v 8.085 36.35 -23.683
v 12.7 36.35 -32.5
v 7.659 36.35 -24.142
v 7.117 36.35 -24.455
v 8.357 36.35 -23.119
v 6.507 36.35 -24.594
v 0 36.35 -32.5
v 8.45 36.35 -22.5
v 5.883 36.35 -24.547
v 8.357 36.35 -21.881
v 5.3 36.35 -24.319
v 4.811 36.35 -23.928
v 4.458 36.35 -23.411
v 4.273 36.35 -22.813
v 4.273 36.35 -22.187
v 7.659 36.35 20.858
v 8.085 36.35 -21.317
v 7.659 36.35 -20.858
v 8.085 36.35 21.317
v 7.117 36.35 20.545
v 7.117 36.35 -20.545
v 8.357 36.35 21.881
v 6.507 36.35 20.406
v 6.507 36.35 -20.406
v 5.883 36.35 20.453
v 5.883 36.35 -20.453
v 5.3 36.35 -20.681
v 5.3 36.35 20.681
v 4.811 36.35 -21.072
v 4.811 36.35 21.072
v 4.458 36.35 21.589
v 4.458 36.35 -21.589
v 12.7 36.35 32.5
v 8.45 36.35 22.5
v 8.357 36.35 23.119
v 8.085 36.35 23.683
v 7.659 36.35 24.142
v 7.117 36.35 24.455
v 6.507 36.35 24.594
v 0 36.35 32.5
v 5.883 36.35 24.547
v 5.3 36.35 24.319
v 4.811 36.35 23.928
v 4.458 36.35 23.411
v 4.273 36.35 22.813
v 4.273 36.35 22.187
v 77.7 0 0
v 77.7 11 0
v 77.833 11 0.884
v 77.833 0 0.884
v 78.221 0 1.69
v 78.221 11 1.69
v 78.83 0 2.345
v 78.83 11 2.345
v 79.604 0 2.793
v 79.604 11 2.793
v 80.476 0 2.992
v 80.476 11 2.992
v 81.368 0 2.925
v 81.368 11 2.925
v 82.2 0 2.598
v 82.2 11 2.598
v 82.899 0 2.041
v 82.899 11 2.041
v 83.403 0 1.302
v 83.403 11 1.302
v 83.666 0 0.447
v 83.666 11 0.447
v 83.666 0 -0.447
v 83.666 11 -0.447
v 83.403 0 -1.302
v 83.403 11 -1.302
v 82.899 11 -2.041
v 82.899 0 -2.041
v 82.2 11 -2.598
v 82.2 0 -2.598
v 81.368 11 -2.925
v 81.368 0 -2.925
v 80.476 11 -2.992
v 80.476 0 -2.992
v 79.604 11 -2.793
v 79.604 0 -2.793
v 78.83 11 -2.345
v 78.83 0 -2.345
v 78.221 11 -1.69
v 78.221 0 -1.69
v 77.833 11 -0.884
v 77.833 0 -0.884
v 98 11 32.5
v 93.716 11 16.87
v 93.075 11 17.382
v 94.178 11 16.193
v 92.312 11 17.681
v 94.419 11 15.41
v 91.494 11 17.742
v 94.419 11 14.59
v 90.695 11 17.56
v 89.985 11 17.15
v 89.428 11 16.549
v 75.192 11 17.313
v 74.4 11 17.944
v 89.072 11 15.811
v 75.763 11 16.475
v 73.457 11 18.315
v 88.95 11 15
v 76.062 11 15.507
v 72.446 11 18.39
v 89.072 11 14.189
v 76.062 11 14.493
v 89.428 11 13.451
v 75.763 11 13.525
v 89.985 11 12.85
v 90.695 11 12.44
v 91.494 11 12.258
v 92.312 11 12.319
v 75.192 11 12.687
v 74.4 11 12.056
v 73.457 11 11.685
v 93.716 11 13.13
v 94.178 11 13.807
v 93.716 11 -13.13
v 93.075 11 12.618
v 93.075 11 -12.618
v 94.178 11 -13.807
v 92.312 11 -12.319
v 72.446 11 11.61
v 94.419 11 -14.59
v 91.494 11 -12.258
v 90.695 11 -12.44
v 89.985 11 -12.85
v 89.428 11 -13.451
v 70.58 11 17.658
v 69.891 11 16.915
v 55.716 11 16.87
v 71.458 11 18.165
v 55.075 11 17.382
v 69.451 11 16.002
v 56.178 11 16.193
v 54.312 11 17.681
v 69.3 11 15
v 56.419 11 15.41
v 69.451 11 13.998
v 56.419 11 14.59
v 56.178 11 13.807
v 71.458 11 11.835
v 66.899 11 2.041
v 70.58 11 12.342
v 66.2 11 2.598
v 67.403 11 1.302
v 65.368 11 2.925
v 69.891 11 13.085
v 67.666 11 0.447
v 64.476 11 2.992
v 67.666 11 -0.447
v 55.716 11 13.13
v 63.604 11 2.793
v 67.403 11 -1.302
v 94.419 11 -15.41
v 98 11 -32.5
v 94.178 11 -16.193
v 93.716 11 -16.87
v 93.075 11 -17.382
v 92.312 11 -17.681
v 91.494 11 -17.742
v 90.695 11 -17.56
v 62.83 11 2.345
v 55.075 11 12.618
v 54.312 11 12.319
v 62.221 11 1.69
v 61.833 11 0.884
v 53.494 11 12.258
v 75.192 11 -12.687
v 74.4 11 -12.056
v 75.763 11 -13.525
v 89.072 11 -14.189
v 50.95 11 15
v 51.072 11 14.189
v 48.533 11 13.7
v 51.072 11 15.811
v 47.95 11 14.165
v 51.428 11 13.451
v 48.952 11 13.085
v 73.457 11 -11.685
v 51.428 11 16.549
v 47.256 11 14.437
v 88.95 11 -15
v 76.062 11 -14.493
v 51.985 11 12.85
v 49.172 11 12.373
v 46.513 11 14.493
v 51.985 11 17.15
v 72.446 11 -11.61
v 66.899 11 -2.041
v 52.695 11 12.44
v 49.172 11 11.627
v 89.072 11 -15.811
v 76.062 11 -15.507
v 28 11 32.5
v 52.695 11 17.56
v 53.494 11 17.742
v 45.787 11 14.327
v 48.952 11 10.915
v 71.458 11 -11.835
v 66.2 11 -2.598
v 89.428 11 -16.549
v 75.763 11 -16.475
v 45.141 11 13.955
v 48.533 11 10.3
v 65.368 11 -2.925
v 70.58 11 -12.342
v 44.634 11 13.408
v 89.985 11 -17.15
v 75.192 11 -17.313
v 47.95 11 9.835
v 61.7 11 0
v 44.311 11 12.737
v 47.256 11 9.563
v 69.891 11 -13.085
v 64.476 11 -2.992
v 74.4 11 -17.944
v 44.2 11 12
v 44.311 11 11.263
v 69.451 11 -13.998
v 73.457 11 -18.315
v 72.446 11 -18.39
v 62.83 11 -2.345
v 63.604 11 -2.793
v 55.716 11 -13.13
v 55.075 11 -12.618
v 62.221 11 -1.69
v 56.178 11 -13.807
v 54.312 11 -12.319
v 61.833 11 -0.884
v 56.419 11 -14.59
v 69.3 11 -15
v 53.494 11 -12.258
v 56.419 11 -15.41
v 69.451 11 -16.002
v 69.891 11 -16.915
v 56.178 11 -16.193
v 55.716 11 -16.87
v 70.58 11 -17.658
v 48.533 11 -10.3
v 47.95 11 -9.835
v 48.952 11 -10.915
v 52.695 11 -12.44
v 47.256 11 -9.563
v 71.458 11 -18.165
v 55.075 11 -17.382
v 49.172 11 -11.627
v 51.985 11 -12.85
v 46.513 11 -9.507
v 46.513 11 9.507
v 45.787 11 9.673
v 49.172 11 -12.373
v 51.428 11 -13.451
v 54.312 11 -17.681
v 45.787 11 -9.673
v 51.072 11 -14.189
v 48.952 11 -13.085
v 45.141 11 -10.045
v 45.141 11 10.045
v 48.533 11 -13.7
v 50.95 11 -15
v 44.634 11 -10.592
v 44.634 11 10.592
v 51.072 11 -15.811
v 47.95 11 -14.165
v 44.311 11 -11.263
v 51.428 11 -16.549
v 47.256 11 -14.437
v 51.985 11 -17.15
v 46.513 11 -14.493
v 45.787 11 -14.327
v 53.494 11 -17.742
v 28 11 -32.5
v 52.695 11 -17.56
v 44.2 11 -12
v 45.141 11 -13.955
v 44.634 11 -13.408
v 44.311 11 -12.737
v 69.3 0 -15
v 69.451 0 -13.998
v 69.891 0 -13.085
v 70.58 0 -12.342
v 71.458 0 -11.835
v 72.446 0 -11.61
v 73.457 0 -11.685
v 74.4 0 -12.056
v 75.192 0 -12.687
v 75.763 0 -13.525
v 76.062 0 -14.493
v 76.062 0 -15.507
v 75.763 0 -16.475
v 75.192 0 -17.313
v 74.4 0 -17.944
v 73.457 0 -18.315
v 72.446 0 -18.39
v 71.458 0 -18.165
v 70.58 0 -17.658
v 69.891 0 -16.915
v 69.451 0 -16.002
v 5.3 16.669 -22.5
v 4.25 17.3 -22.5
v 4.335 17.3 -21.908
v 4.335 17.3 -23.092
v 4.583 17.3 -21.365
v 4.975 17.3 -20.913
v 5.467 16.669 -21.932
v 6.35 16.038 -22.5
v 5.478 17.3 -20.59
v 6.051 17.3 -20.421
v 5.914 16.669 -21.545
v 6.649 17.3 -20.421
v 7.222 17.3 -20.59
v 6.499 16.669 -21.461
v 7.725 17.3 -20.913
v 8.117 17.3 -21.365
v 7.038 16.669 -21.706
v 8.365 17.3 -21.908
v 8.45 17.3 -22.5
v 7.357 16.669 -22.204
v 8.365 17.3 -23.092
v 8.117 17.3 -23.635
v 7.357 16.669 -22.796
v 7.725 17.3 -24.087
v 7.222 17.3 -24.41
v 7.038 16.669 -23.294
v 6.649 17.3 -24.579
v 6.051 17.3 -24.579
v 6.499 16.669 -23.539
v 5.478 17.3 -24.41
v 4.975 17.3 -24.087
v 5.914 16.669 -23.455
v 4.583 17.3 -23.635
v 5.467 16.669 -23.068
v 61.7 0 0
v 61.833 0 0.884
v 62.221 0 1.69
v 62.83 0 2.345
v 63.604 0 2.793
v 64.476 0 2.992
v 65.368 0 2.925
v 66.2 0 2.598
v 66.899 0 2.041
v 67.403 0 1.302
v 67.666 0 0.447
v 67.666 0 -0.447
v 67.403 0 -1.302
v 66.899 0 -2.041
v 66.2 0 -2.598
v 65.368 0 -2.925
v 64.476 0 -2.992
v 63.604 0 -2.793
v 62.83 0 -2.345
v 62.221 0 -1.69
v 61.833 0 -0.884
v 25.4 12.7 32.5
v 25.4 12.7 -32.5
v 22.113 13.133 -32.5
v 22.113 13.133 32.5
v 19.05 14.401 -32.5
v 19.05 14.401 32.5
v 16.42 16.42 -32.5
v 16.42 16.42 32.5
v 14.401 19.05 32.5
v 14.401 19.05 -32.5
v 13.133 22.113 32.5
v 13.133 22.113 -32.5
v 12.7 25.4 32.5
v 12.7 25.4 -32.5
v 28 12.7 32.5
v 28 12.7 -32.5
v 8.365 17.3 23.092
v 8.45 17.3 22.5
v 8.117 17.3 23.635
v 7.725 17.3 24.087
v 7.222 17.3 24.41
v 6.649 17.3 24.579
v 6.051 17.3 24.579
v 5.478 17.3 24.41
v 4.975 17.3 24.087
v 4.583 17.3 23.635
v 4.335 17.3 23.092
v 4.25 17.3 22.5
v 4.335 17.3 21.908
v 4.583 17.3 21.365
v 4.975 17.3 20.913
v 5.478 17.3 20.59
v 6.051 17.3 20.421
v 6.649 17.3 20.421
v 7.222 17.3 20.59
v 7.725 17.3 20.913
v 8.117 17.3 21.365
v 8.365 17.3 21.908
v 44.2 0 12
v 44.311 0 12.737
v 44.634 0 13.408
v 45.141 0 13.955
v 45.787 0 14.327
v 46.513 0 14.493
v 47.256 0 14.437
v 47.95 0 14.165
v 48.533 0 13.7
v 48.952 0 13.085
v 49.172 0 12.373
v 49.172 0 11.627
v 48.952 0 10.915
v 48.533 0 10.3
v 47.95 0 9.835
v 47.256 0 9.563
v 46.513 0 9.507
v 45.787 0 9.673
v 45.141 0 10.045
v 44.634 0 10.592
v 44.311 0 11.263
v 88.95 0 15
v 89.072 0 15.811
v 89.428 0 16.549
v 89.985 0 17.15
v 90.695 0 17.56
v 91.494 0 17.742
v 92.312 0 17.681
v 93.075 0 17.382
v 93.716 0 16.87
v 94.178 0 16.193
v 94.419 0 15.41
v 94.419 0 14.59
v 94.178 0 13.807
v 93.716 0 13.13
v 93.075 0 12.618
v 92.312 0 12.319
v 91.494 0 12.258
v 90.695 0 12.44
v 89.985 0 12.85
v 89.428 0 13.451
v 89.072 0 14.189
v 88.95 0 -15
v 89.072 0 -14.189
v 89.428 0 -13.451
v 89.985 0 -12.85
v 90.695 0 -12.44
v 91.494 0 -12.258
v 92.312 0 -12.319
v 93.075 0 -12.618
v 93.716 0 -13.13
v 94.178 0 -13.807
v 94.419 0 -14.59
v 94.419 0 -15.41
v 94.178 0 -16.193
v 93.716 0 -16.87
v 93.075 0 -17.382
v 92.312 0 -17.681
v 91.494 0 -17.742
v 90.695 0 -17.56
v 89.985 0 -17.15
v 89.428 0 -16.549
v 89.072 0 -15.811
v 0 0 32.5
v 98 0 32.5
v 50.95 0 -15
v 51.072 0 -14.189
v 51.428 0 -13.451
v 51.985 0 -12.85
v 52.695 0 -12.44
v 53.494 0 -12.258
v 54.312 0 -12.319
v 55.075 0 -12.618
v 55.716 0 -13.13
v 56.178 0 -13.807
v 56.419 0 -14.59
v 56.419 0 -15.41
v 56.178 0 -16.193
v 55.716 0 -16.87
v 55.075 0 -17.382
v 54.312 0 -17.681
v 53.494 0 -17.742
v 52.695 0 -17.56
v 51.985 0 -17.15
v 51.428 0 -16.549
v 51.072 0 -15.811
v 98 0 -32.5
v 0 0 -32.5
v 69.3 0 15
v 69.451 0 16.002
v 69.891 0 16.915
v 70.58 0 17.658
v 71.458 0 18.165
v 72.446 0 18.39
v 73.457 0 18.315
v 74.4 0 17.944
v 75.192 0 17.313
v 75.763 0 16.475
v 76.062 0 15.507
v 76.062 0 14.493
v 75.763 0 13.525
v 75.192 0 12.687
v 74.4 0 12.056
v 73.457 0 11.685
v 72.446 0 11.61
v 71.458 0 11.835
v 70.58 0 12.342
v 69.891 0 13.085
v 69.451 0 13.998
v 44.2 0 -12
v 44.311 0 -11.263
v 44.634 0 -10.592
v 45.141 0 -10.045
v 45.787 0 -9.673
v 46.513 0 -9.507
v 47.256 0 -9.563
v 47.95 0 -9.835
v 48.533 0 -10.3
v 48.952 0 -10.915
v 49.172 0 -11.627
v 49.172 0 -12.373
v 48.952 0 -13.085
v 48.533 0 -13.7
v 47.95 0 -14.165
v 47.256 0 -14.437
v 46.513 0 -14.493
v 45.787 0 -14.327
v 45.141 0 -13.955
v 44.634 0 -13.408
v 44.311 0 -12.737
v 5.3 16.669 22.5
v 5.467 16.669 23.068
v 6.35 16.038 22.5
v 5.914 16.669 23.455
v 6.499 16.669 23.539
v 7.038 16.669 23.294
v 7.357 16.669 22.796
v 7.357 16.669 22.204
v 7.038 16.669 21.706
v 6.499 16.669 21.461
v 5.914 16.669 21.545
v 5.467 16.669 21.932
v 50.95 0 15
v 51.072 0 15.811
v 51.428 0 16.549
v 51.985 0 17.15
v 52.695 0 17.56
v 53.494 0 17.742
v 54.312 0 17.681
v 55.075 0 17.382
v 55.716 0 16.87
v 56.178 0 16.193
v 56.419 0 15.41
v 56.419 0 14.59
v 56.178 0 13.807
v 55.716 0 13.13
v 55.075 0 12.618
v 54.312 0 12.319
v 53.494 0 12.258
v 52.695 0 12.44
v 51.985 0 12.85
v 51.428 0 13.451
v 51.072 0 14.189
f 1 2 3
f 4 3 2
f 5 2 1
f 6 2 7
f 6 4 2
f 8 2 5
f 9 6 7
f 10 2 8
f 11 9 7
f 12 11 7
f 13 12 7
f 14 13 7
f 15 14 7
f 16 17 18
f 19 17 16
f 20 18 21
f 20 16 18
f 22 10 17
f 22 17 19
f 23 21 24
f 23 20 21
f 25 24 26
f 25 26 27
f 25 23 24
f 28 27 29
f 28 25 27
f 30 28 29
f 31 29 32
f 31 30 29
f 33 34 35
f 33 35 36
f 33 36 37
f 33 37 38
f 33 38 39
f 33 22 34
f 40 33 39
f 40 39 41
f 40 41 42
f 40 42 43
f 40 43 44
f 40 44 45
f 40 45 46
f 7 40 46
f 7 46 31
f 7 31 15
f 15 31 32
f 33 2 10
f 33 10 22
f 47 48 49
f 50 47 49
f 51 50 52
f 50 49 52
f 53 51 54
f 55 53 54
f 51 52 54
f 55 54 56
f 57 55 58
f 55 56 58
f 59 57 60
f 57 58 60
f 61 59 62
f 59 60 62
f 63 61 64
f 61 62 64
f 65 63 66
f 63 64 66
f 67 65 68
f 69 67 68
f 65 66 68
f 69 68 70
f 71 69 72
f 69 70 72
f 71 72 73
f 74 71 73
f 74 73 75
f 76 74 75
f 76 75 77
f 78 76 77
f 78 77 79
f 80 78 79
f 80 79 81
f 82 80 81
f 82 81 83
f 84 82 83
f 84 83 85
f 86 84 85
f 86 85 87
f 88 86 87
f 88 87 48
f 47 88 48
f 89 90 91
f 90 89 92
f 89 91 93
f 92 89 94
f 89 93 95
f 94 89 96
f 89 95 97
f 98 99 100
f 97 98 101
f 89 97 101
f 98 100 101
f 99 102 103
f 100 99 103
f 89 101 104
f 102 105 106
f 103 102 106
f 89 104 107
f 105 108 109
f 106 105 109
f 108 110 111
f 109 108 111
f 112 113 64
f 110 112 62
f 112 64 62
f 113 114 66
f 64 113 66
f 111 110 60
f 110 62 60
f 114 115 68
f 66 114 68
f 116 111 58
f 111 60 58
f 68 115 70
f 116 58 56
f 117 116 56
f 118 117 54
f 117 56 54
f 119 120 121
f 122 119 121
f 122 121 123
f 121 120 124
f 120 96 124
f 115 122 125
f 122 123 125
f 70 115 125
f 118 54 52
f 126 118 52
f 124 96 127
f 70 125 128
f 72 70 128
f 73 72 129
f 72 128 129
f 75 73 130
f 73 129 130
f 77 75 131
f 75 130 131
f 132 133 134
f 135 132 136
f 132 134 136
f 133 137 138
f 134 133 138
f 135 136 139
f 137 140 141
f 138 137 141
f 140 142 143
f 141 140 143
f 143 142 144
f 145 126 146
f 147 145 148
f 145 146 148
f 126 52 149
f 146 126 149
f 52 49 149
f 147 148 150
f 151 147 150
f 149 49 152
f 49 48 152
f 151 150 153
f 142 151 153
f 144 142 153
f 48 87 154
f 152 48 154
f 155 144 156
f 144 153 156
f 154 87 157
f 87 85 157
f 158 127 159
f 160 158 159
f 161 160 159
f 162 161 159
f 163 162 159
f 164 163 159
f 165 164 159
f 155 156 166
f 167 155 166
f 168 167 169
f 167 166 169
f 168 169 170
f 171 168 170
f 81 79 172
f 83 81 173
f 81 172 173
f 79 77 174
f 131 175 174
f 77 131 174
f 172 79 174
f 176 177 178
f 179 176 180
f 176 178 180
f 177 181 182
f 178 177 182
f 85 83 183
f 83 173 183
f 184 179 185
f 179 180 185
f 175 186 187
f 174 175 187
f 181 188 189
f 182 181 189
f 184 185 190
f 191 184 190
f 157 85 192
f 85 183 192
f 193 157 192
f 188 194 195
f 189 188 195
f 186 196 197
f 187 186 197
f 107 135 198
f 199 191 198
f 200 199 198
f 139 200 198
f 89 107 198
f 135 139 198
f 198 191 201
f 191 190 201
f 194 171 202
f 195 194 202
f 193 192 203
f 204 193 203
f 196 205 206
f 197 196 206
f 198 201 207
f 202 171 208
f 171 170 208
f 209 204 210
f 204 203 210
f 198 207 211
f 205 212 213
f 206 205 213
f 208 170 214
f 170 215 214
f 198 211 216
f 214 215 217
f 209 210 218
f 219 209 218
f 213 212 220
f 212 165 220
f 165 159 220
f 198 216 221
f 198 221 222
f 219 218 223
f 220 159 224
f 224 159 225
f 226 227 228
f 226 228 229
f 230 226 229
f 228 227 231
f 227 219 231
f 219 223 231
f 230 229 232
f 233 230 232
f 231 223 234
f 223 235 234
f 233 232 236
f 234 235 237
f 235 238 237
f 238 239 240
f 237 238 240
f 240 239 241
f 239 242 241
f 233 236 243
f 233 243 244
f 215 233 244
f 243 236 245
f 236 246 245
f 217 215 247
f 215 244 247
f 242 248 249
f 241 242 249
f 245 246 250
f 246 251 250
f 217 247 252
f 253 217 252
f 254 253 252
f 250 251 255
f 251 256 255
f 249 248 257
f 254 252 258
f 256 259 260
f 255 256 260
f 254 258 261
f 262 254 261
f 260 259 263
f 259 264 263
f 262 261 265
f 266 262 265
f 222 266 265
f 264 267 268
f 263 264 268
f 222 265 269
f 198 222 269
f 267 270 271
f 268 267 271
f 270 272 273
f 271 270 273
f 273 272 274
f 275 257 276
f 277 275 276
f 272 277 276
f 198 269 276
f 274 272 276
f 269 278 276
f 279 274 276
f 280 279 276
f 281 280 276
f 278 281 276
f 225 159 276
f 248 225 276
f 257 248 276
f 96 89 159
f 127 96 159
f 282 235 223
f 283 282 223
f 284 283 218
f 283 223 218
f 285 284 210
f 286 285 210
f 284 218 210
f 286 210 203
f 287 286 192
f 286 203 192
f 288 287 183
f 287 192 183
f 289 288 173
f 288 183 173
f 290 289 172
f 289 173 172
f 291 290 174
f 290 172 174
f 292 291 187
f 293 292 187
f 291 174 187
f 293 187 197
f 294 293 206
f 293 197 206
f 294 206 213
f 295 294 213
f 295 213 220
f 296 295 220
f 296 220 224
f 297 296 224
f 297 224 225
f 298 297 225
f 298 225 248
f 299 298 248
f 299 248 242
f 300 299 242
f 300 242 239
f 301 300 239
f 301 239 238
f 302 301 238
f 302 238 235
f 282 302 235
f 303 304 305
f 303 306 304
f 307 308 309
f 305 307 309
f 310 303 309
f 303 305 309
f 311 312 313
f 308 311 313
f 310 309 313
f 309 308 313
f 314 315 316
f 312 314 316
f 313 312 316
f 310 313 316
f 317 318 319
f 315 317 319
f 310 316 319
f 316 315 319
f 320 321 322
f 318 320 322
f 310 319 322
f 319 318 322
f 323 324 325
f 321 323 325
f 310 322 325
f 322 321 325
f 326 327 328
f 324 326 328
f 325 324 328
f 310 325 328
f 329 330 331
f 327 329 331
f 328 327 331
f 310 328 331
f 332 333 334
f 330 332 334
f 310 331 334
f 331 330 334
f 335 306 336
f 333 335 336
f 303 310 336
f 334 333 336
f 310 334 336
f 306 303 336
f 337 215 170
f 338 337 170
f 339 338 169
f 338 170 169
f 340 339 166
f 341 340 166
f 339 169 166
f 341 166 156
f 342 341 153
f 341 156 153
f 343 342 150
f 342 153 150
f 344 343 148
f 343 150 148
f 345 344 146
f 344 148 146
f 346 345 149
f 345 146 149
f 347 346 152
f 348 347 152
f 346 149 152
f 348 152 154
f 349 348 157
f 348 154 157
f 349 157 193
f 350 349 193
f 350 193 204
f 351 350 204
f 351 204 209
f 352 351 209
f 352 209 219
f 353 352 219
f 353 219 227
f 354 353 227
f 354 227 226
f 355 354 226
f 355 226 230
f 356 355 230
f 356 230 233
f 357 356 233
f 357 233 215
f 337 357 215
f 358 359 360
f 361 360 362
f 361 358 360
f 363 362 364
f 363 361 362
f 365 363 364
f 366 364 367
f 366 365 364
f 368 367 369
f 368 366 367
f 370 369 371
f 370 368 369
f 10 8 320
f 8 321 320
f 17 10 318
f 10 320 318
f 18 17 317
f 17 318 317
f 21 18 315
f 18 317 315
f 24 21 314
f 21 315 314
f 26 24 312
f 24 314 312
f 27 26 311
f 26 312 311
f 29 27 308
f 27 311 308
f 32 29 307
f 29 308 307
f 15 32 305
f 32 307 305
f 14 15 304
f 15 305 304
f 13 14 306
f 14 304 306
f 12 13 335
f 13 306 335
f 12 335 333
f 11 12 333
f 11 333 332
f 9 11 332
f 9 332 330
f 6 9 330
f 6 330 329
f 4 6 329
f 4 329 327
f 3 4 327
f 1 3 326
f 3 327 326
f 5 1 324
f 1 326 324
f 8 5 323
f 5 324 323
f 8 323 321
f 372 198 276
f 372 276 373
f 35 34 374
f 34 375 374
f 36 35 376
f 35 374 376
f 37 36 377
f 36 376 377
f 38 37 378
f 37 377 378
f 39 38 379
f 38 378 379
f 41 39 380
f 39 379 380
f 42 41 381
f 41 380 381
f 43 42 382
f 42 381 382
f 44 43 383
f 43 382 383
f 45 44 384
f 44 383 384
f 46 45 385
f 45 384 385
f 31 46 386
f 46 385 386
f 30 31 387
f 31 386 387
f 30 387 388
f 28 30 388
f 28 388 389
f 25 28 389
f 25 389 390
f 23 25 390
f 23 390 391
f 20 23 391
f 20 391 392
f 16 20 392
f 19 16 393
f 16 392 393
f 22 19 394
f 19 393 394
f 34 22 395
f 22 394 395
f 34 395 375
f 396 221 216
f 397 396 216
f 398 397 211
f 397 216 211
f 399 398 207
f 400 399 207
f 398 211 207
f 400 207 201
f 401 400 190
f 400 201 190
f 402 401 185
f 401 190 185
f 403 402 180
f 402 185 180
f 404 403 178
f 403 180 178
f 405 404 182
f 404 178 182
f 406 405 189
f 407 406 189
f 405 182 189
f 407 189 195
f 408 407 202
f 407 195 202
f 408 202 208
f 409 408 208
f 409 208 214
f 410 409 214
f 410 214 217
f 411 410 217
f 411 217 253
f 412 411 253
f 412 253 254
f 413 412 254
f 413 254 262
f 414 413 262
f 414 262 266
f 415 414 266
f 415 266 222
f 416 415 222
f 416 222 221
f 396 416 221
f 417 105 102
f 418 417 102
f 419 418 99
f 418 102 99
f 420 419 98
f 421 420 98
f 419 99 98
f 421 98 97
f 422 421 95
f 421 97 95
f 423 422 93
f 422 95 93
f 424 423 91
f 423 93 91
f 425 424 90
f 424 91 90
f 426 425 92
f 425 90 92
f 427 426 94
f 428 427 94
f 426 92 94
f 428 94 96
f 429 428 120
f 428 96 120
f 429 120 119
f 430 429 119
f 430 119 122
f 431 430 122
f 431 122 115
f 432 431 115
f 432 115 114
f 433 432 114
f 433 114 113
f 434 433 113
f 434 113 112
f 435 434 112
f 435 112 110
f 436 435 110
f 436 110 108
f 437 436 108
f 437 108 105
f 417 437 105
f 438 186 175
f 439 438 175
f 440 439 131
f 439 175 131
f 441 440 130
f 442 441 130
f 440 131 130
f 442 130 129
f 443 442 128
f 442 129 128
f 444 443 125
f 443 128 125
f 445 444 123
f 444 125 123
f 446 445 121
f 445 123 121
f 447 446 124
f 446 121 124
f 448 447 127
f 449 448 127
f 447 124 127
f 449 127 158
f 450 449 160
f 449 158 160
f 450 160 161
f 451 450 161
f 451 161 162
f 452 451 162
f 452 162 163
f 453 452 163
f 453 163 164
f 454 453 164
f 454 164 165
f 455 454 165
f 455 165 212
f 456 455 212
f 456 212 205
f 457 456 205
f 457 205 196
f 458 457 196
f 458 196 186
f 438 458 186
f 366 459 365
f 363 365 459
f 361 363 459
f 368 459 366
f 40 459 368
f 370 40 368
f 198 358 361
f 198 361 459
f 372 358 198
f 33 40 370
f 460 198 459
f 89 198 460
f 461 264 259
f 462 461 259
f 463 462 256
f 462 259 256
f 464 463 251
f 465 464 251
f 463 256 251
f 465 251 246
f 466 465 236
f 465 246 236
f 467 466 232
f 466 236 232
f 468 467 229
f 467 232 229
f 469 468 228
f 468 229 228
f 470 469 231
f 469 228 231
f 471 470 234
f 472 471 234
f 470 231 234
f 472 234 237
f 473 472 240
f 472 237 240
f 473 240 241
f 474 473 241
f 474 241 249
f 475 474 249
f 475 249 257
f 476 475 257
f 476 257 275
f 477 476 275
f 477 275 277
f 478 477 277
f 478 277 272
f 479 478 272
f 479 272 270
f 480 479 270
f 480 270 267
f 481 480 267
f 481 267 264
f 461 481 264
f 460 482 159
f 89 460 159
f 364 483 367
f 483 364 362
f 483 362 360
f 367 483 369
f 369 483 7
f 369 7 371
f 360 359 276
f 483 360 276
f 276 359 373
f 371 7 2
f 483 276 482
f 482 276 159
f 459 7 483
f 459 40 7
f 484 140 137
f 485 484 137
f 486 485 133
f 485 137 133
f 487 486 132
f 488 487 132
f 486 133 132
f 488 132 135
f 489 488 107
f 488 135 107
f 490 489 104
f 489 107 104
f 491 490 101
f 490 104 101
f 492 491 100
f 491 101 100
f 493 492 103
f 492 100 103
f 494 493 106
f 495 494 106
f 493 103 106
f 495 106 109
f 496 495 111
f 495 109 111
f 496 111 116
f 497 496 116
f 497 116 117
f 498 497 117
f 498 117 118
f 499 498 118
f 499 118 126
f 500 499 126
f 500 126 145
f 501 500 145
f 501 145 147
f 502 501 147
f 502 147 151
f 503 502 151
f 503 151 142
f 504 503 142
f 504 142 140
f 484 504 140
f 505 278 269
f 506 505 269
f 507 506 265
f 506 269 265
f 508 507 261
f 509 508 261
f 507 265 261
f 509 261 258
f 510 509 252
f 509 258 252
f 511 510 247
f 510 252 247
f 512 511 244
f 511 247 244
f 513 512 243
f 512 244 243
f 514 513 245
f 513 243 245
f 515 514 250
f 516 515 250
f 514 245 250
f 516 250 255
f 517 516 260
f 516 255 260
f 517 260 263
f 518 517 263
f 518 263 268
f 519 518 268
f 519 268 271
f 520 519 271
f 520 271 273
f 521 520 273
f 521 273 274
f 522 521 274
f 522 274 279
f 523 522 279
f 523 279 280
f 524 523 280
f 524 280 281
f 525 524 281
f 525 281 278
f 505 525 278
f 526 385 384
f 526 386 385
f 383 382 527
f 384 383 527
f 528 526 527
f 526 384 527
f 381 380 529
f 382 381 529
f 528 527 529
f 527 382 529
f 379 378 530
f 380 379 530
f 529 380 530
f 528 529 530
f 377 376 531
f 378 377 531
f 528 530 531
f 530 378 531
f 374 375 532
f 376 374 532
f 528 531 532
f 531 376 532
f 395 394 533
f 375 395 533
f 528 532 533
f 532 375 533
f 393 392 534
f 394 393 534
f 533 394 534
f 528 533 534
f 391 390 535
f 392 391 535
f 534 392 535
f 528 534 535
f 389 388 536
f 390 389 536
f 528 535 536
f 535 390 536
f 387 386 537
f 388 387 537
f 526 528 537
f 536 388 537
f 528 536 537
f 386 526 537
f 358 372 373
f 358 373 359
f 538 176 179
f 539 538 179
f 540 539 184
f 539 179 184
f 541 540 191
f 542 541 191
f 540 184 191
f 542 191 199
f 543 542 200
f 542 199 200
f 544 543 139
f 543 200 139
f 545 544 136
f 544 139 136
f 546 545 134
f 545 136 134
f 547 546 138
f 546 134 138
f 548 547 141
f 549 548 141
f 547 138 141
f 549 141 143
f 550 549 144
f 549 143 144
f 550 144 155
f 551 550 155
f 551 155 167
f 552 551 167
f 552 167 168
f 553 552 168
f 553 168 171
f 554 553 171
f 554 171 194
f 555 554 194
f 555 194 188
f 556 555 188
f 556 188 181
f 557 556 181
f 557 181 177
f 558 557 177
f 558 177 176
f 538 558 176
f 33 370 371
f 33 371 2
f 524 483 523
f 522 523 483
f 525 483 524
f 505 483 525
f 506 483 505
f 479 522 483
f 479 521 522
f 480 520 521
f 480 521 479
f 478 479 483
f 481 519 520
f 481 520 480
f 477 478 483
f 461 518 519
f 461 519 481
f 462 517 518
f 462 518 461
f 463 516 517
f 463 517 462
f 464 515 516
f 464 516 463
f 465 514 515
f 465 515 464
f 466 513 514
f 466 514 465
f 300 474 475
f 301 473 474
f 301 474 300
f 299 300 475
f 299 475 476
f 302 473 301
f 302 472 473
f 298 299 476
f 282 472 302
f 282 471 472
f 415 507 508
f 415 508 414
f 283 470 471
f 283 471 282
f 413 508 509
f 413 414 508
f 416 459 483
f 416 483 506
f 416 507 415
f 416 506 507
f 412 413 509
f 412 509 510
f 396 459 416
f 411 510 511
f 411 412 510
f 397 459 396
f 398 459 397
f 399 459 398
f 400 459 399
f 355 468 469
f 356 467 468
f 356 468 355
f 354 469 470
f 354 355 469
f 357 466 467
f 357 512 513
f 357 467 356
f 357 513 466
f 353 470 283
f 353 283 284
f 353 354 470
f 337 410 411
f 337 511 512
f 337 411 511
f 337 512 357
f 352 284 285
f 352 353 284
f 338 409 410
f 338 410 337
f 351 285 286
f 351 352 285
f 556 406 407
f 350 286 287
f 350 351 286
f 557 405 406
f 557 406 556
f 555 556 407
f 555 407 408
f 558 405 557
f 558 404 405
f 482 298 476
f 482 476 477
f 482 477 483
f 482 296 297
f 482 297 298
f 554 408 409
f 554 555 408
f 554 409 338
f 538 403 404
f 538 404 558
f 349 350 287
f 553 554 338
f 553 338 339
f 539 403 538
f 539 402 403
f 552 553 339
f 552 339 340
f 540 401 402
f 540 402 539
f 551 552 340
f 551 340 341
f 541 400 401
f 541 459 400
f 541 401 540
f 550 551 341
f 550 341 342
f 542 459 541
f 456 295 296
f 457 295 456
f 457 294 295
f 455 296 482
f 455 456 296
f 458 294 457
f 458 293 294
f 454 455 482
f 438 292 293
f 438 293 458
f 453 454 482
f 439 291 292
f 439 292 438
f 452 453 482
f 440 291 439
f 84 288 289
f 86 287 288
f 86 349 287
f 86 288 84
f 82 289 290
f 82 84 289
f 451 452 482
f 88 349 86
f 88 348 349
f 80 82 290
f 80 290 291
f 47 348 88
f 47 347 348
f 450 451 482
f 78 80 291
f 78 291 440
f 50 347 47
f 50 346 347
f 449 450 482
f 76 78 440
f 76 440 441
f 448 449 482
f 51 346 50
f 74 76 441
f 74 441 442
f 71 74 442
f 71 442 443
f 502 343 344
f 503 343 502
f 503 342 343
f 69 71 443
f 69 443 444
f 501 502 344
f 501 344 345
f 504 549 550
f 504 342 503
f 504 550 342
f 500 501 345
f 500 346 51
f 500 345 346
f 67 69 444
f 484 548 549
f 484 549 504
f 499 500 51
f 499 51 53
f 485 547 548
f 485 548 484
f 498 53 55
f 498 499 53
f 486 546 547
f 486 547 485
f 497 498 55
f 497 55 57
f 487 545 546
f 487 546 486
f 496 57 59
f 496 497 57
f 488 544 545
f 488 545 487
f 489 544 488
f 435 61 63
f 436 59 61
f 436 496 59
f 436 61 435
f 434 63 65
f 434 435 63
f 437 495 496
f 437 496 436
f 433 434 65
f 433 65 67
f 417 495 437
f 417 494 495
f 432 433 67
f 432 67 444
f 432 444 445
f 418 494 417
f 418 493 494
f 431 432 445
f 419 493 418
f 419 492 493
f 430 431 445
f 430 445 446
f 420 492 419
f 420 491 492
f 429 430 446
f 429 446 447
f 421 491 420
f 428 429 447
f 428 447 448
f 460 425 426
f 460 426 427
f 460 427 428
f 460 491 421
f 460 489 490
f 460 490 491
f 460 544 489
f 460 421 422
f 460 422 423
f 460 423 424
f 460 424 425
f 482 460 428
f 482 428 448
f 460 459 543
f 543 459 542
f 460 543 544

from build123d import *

# Parameters (mm, degrees)
EXTRUDE1_DEPTH            = 32.5
SKETCH2_W                 = 70
SKETCH2_H                 = 1.7
CUT_EXTRUDE1_DEPTH        = 124.086646311
M5_CLEARANCE_HOLE1_D      = 5.5
M5X0_8_TAPPED_HOLE1_D     = 4.2
M5X0_8_TAPPED_HOLE1_DEPTH = 19.05
M5X0_8_TAPPED_HOLE1_TIP   = 1.2618073
F_5_0_5_DIAMETER_HOLE1_D  = 5
M8X1_25_TAPPED_HOLE1_D    = 6.8
F_6_0_6_DIAMETER_HOLE1_D  = 6


with BuildPart() as part:
    # Sketch1 → Extrude1 (new, symmetric)
    with BuildSketch(Plane.XY):
        with BuildLine():
            Line((0, 0), (98, 0))
            Line((98, 0), (98, 12.7))
            Line((98, 12.7), (25.4, 12.7))
            ThreePointArc((25.4, 12.7), (16.419743879, 16.419743879), (12.7, 25.4))
            Line((12.7, 25.4), (12.7, 36.35))
            Line((12.7, 36.35), (0, 36.35))
            Line((0, 36.35), (0, 0))
        make_face()
    extrude(amount=EXTRUDE1_DEPTH, both=True)

    # Sketch2 → Cut-Extrude1 (cut, through all)
    with BuildSketch(Plane(origin=(0, 0, -32.5), x_dir=(-1, 0, 0), z_dir=(0, 0, -1))):
        with Locations((-63, 11.85)):
            Rectangle(SKETCH2_W, SKETCH2_H)
    extrude(amount=-CUT_EXTRUDE1_DEPTH, mode=Mode.SUBTRACT)

    # M5 Clearance Hole1 (through all)
    with Locations(Plane.XZ):
        with Locations((53.7, 15), (91.7, 15), (91.7, -15), (53.7, -15)):
            Hole(M5_CLEARANCE_HOLE1_D / 2)

    # M5x0.8 Tapped Hole1
    with Locations(Plane(origin=(0, 36.35, 0), x_dir=(-1, 0, 0), z_dir=(0, 1, 0))):
        with Locations((-6.35, 22.5), (-6.35, -22.5)):
            Hole(M5X0_8_TAPPED_HOLE1_D / 2, depth=M5X0_8_TAPPED_HOLE1_DEPTH)
            with Locations((0, 0, -(M5X0_8_TAPPED_HOLE1_DEPTH + M5X0_8_TAPPED_HOLE1_TIP / 2))):  # 118° drill point
                Cone(0, M5X0_8_TAPPED_HOLE1_D / 2, M5X0_8_TAPPED_HOLE1_TIP, mode=Mode.SUBTRACT)

    # Ø5.0 (5) Diameter Hole1 (through all)
    with Locations(Plane.XZ):
        with Locations((46.70001183, 12), (46.70001183, -12)):
            Hole(F_5_0_5_DIAMETER_HOLE1_D / 2)

    # M8x1.25 Tapped Hole1 (through all)
    with Locations(Plane.XZ):
        with Locations((72.7, -15), (72.7, 15)):
            Hole(M8X1_25_TAPPED_HOLE1_D / 2)

    # Ø6.0 (6) Diameter Hole1 (through all)
    with Locations(Plane.XZ):
        with Locations((64.7, 0), (80.7, 0)):
            Hole(F_6_0_6_DIAMETER_HOLE1_D / 2)


solid = part.part
